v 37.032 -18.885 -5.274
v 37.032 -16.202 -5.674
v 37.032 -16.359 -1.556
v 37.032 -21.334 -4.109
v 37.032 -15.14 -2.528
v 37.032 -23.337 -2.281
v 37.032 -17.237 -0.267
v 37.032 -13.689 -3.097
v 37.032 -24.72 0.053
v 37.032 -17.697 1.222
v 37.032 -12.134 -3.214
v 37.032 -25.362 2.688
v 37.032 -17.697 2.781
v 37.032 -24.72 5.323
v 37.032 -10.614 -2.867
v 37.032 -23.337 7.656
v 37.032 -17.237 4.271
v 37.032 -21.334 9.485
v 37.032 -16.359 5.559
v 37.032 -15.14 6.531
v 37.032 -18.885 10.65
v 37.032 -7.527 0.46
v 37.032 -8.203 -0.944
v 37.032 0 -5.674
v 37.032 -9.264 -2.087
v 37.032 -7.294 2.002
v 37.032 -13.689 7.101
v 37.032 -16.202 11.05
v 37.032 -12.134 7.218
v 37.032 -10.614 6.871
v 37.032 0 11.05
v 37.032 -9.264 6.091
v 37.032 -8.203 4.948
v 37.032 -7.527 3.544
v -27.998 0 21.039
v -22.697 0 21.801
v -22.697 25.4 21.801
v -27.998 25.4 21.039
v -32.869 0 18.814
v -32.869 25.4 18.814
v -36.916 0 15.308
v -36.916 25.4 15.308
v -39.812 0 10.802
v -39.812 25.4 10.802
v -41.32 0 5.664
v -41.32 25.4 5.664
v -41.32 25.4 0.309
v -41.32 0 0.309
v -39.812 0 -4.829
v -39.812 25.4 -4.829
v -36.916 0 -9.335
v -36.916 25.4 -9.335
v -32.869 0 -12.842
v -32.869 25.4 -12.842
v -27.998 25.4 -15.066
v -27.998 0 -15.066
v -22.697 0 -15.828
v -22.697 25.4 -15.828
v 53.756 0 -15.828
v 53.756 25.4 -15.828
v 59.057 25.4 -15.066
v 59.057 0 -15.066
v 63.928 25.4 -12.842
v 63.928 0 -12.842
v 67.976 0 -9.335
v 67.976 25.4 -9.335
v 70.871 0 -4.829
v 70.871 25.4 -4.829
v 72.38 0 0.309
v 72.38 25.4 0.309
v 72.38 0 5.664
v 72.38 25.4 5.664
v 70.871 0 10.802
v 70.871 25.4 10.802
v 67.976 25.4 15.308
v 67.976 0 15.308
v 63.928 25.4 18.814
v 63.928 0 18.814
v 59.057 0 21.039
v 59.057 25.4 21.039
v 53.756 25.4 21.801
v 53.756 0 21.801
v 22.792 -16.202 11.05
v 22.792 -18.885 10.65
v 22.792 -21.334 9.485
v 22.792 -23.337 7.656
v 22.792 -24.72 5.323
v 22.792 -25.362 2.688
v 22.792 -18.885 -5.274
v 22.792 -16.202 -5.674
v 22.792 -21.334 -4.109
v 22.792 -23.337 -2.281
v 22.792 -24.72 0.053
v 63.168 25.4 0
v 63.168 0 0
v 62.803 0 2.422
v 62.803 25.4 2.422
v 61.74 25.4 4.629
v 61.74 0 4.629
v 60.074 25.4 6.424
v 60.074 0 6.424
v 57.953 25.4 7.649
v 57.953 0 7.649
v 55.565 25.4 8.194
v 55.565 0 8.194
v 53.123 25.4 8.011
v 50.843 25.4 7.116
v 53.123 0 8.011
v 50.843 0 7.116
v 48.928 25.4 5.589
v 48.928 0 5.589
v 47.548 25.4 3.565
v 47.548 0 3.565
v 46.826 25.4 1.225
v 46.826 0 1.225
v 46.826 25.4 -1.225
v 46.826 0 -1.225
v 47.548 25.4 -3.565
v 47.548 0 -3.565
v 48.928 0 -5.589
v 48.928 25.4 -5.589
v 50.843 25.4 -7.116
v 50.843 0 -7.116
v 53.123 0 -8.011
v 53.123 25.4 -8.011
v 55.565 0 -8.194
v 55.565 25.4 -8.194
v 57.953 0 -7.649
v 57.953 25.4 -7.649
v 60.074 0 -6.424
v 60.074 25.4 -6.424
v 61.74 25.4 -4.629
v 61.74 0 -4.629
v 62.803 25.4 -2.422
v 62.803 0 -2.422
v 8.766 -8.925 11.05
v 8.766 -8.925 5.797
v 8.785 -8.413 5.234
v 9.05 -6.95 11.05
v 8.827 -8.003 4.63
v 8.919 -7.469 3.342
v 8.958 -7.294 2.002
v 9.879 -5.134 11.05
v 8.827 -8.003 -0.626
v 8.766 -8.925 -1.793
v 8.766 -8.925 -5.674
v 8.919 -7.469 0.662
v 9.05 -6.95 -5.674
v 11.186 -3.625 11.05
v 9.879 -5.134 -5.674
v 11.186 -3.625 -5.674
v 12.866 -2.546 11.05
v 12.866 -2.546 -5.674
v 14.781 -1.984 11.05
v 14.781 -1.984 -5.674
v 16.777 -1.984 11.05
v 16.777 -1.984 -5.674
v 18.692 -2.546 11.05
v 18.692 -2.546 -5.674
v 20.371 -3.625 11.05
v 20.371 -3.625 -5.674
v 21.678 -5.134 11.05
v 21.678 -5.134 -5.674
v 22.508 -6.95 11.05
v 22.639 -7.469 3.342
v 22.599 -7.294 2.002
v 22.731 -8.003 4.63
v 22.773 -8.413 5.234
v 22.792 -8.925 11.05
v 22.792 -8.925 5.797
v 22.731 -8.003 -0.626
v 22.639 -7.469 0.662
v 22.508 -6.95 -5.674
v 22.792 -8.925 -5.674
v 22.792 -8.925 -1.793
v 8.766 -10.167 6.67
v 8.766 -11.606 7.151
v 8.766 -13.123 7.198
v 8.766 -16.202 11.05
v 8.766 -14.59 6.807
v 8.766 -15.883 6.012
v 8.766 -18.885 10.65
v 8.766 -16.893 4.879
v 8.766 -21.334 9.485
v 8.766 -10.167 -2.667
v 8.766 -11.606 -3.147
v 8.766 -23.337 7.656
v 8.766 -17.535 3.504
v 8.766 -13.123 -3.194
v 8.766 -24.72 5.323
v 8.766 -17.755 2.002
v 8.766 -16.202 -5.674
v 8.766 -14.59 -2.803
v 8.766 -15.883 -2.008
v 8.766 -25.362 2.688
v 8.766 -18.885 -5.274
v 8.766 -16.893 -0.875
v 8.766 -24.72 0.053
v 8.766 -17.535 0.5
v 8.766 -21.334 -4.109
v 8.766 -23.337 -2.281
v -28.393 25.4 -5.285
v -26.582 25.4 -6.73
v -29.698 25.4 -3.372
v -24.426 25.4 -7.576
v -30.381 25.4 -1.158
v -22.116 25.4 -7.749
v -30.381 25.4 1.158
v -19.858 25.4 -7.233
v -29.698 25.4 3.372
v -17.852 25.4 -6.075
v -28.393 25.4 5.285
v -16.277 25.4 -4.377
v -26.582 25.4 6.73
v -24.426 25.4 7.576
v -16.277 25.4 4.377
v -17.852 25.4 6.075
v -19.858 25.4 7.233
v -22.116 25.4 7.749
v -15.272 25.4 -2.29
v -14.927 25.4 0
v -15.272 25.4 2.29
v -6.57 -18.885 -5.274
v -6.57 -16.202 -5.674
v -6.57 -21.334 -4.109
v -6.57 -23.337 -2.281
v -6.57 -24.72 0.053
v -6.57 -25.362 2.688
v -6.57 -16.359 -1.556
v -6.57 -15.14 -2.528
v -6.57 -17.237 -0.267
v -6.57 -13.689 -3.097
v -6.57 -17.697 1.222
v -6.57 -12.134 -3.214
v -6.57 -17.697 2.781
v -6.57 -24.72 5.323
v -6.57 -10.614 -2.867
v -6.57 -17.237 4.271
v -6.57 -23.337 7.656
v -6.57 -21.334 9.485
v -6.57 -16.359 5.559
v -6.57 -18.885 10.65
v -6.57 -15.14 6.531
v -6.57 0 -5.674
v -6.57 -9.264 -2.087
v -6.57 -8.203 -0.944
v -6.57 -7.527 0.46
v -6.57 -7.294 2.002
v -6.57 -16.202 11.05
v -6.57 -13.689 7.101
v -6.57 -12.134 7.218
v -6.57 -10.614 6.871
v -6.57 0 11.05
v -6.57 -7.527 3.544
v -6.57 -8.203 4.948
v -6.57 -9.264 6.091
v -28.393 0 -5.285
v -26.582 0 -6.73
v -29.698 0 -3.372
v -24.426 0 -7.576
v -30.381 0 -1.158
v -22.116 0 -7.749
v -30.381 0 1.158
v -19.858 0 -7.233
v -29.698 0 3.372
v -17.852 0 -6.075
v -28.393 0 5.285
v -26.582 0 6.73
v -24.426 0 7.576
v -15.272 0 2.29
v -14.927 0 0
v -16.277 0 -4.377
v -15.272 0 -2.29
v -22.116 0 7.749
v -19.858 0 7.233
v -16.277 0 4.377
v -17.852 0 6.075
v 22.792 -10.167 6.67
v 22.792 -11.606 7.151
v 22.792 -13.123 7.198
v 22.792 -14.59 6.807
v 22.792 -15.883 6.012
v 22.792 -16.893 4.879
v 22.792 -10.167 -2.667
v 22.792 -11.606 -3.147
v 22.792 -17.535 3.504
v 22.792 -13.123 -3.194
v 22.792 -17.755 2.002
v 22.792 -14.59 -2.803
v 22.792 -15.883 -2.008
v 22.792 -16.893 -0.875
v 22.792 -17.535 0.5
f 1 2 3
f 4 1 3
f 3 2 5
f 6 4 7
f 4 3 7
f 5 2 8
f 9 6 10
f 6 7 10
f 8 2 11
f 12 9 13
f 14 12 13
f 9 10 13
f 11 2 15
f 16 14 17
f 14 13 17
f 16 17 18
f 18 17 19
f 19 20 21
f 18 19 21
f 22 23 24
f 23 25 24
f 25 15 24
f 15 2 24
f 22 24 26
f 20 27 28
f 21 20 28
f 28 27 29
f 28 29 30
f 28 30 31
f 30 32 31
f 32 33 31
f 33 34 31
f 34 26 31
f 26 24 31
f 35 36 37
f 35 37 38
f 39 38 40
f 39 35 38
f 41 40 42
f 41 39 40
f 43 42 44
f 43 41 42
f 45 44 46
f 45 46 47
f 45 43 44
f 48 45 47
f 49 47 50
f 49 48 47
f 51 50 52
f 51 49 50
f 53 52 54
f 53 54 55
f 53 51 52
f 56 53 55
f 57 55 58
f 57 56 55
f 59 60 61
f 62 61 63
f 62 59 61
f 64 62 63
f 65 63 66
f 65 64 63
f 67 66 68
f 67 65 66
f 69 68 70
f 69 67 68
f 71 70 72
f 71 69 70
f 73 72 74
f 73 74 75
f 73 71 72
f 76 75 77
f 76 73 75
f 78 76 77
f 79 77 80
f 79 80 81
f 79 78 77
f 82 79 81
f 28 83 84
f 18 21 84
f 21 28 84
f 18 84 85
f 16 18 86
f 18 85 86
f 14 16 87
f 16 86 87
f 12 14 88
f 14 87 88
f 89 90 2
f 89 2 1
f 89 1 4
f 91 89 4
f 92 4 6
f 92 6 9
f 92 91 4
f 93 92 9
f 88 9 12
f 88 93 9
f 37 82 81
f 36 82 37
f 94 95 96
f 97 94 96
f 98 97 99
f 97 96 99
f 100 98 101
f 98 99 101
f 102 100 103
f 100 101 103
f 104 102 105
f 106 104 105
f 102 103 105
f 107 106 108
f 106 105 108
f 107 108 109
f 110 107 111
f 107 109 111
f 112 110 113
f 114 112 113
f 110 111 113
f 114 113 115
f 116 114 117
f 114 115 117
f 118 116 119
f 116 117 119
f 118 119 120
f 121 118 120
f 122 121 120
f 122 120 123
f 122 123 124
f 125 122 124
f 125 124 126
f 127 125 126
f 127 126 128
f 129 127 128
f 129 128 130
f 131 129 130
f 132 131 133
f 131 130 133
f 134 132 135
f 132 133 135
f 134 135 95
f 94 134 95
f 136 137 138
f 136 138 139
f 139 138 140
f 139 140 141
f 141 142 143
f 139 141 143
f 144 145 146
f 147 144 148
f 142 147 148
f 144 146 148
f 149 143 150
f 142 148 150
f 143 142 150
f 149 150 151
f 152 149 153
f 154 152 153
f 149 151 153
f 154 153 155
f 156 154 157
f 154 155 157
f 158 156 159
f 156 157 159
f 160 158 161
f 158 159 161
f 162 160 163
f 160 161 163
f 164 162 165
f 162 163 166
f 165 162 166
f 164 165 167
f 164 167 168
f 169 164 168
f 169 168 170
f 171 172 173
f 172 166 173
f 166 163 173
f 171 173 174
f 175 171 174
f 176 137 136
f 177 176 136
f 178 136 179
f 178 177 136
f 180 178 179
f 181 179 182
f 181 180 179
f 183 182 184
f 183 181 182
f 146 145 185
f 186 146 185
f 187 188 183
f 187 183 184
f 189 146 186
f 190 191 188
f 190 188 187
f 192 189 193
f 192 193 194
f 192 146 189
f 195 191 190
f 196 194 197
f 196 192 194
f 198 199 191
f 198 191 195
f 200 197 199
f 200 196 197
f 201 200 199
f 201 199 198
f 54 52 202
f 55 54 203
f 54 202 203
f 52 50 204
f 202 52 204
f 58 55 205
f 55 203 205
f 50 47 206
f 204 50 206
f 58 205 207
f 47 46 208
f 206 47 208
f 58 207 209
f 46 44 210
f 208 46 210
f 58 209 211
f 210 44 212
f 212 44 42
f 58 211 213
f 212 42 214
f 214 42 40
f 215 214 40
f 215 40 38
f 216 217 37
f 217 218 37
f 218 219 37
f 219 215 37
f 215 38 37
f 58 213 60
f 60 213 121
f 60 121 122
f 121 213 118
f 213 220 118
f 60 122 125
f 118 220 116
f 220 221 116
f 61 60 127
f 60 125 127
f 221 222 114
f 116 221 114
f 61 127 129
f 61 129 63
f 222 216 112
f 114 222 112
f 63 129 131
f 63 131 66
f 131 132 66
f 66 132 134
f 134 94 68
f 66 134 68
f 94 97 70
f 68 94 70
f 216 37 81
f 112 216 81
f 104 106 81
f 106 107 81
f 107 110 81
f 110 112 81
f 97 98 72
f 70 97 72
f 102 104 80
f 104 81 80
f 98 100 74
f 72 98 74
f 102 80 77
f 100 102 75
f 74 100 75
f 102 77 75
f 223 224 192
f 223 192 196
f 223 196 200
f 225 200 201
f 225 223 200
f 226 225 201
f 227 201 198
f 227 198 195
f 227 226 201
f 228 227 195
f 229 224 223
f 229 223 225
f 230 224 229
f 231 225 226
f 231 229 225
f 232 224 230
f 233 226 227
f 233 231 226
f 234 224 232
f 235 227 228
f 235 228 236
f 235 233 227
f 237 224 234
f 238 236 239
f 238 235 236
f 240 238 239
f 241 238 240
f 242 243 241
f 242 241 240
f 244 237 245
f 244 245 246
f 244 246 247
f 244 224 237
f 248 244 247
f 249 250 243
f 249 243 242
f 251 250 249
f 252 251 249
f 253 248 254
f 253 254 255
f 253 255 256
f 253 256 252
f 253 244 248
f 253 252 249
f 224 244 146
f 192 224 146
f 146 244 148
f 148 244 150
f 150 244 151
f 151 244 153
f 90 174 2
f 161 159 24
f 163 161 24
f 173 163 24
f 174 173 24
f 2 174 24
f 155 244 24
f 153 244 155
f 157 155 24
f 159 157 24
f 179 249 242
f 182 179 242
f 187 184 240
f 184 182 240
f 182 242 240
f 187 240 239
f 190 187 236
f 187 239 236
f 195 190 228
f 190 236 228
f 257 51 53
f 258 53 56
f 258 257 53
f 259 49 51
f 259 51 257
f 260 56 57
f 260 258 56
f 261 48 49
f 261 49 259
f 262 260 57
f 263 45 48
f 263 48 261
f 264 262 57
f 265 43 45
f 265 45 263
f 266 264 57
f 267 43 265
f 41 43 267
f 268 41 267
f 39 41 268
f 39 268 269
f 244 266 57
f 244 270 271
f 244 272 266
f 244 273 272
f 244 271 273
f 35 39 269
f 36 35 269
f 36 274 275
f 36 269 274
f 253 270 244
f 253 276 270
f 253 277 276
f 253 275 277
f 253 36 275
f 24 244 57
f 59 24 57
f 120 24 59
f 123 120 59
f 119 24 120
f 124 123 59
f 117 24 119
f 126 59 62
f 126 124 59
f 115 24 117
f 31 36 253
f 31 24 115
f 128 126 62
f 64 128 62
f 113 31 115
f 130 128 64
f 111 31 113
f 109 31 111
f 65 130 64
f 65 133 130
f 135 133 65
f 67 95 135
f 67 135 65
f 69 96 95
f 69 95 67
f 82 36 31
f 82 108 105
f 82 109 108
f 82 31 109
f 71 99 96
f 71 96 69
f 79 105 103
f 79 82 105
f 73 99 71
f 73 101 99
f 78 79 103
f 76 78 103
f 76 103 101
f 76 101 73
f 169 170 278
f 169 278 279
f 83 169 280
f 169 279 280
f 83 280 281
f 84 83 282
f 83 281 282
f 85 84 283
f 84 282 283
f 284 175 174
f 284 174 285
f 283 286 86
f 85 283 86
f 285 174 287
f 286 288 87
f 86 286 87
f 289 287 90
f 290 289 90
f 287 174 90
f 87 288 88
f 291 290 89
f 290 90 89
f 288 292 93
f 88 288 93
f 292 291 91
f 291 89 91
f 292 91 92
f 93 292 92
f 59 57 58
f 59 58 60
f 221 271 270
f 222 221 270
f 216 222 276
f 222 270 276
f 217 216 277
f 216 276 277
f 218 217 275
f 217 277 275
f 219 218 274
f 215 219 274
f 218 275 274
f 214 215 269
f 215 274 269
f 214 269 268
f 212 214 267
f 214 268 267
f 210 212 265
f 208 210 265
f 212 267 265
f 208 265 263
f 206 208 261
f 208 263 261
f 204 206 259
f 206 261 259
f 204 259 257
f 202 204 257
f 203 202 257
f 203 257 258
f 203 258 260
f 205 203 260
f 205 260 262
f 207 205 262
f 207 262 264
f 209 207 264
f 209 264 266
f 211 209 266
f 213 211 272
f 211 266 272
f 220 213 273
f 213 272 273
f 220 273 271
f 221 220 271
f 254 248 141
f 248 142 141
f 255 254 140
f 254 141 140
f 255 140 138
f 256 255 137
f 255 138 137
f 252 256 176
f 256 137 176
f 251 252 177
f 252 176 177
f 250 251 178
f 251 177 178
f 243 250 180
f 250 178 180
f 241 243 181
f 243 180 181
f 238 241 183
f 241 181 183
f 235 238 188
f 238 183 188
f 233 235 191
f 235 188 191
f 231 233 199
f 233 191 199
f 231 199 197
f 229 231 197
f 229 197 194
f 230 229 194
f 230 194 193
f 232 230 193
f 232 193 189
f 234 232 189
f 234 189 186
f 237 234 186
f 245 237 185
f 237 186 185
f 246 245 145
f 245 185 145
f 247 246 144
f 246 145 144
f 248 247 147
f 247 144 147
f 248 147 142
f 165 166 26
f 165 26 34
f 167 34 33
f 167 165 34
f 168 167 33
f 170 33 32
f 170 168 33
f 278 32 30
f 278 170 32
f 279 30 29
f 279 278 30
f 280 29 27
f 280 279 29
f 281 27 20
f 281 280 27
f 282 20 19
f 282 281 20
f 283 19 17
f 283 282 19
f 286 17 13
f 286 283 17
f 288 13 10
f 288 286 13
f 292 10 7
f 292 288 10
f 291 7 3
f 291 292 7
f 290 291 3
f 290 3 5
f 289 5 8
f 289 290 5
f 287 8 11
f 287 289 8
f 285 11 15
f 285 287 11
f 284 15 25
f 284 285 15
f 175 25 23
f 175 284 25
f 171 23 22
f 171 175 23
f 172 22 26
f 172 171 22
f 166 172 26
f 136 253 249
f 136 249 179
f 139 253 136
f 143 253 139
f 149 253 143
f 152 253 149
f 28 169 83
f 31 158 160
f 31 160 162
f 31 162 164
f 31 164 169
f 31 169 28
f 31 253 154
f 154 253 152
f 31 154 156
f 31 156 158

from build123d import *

# Parameters (mm, degrees)
F1_DEPTH     = 25.4
F2_R         = 7.7705666036
F2_R_2       = 8.2168581005
F3_DEPTH     = 25.4
F4_W         = 43.6024717055
F4_H         = 16.7242367752
F5_DEPTH     = 25.4
F6_R         = 5.2303111982
F7_DEPTH     = 66.548
F8_DEPTH     = 50.546
F9_W         = 14.0256546438
F9_H         = 16.4745816305
F10_DEPTH    = 27.4765354039
F11_T1_DEPTH = 61.3270374103
F11_T3_DEPTH = 60.2313163778


# Not quite as in the source:
# - a fillet or chamfer that OpenCascade refuses, or shapes differently, is made with other operations: its cross-section is extruded or revolved along the edge and cut away or added


with BuildPart() as f1:
    # F0 (on Front) → F1 (new body)
    with BuildSketch(Plane.XZ):
        with BuildLine():
            Line((53.756467998, 21.8012407422), (-22.6971805096, 21.8012407422))
            ThreePointArc((-22.6971805096, 21.8012407422), (-41.5119482204, 2.9864730313), (-22.6971805096, -15.8282946795))
            Line((-22.6971805096, -15.8282946795), (53.756467998, -15.8282946795))
            ThreePointArc((53.756467998, -15.8282946795), (72.5712357089, 2.9864730313), (53.756467998, 21.8012407422))
        make_face()
    extrude(amount=-F1_DEPTH)

    # F2 (on Front) → F3 (cut)
    with BuildSketch(Plane.XZ):
        with Locations((-22.6971805096, 0)):
            Circle(F2_R)
        with Locations((54.9510717392, 0)):
            Circle(F2_R_2)
    extrude(amount=-F3_DEPTH, mode=Mode.SUBTRACT)

    # F4 (on Front) → F5 (join)
    with BuildSketch(Plane.XZ):
        with Locations((15.2310032863, 2.6878237259)):
            Rectangle(F4_W, F4_H)
    extrude(amount=F5_DEPTH)

    # F6 (on Right) → F7 (cut)
    with BuildSketch(Plane.YZ):
        with Locations((-12.524679536, 2.001857613)):
            Circle(F6_R)
    extrude(amount=F7_DEPTH, mode=Mode.SUBTRACT)

    # F6 (on Right) → F8 (cut)
    with BuildSketch(Plane.YZ):
        with Locations((-12.524679536, 2.001857613)):
            Circle(F6_R)
    extrude(amount=-F8_DEPTH, mode=Mode.SUBTRACT)

    # F9 (on face) → F10 (cut, through all)
    with BuildSketch(Plane(origin=(0, 0, -5.6742946617), x_dir=(1, 0, 0), z_dir=(0, 0, -1))):
        with Locations((15.7788638026, 17.1627091847)):
            Rectangle(F9_W, F9_H)
        with BuildLine():
            Line((22.7916911244, 8.9254183695), (8.7660364807, 8.9254183695))
            ThreePointArc((8.7660364807, 8.9254183695), (15.7788638026, 1.9125910476), (22.7916911244, 8.9254183695))
        make_face()
    extrude(amount=-F10_DEPTH, mode=Mode.SUBTRACT)

    # F11: fillet of radius 9.1981536726 on 4 edges, made by hand

    # F11_s2 → F11_t1 (cut)
    with BuildSketch(Plane.YZ.offset(-29.565616748)):
        with BuildLine():
            ThreePointArc((-16.2018463274, -5.6742946617), (-22.7059231637, -2.9802178254), (-25.4, 3.5238590109))
            Line((-25.4, 3.5238590109), (-25.4, -5.6742946617))
            Line((-25.4, -5.6742946617), (-16.2018463274, -5.6742946617))
        make_face()
        with BuildLine():
            ThreePointArc((-16.2018463274, 11.0499421135), (-22.7059231637, 8.3558652771), (-25.4, 1.8517884408))
            Line((-25.4, 1.8517884408), (-25.4, 11.0499421135))
            Line((-25.4, 11.0499421135), (-16.2018463274, 11.0499421135))
        make_face()
    extrude(amount=F11_T1_DEPTH, mode=Mode.SUBTRACT)

    # F11_s4 → F11_t3 (cut)
    with BuildSketch(Plane.YZ.offset(-0.2036930572)):
        with BuildLine():
            ThreePointArc((-16.2018463274, -5.6742946617), (-22.7059231637, -2.9802178254), (-25.4, 3.5238590109))
            Line((-25.4, 3.5238590109), (-25.4, -5.6742946617))
            Line((-25.4, -5.6742946617), (-16.2018463274, -5.6742946617))
        make_face()
        with BuildLine():
            ThreePointArc((-16.2018463274, 11.0499421135), (-22.7059231637, 8.3558652771), (-25.4, 1.8517884408))
            Line((-25.4, 1.8517884408), (-25.4, 11.0499421135))
            Line((-25.4, 11.0499421135), (-16.2018463274, 11.0499421135))
        make_face()
    extrude(amount=F11_T3_DEPTH, mode=Mode.SUBTRACT)


solid = f1.part
